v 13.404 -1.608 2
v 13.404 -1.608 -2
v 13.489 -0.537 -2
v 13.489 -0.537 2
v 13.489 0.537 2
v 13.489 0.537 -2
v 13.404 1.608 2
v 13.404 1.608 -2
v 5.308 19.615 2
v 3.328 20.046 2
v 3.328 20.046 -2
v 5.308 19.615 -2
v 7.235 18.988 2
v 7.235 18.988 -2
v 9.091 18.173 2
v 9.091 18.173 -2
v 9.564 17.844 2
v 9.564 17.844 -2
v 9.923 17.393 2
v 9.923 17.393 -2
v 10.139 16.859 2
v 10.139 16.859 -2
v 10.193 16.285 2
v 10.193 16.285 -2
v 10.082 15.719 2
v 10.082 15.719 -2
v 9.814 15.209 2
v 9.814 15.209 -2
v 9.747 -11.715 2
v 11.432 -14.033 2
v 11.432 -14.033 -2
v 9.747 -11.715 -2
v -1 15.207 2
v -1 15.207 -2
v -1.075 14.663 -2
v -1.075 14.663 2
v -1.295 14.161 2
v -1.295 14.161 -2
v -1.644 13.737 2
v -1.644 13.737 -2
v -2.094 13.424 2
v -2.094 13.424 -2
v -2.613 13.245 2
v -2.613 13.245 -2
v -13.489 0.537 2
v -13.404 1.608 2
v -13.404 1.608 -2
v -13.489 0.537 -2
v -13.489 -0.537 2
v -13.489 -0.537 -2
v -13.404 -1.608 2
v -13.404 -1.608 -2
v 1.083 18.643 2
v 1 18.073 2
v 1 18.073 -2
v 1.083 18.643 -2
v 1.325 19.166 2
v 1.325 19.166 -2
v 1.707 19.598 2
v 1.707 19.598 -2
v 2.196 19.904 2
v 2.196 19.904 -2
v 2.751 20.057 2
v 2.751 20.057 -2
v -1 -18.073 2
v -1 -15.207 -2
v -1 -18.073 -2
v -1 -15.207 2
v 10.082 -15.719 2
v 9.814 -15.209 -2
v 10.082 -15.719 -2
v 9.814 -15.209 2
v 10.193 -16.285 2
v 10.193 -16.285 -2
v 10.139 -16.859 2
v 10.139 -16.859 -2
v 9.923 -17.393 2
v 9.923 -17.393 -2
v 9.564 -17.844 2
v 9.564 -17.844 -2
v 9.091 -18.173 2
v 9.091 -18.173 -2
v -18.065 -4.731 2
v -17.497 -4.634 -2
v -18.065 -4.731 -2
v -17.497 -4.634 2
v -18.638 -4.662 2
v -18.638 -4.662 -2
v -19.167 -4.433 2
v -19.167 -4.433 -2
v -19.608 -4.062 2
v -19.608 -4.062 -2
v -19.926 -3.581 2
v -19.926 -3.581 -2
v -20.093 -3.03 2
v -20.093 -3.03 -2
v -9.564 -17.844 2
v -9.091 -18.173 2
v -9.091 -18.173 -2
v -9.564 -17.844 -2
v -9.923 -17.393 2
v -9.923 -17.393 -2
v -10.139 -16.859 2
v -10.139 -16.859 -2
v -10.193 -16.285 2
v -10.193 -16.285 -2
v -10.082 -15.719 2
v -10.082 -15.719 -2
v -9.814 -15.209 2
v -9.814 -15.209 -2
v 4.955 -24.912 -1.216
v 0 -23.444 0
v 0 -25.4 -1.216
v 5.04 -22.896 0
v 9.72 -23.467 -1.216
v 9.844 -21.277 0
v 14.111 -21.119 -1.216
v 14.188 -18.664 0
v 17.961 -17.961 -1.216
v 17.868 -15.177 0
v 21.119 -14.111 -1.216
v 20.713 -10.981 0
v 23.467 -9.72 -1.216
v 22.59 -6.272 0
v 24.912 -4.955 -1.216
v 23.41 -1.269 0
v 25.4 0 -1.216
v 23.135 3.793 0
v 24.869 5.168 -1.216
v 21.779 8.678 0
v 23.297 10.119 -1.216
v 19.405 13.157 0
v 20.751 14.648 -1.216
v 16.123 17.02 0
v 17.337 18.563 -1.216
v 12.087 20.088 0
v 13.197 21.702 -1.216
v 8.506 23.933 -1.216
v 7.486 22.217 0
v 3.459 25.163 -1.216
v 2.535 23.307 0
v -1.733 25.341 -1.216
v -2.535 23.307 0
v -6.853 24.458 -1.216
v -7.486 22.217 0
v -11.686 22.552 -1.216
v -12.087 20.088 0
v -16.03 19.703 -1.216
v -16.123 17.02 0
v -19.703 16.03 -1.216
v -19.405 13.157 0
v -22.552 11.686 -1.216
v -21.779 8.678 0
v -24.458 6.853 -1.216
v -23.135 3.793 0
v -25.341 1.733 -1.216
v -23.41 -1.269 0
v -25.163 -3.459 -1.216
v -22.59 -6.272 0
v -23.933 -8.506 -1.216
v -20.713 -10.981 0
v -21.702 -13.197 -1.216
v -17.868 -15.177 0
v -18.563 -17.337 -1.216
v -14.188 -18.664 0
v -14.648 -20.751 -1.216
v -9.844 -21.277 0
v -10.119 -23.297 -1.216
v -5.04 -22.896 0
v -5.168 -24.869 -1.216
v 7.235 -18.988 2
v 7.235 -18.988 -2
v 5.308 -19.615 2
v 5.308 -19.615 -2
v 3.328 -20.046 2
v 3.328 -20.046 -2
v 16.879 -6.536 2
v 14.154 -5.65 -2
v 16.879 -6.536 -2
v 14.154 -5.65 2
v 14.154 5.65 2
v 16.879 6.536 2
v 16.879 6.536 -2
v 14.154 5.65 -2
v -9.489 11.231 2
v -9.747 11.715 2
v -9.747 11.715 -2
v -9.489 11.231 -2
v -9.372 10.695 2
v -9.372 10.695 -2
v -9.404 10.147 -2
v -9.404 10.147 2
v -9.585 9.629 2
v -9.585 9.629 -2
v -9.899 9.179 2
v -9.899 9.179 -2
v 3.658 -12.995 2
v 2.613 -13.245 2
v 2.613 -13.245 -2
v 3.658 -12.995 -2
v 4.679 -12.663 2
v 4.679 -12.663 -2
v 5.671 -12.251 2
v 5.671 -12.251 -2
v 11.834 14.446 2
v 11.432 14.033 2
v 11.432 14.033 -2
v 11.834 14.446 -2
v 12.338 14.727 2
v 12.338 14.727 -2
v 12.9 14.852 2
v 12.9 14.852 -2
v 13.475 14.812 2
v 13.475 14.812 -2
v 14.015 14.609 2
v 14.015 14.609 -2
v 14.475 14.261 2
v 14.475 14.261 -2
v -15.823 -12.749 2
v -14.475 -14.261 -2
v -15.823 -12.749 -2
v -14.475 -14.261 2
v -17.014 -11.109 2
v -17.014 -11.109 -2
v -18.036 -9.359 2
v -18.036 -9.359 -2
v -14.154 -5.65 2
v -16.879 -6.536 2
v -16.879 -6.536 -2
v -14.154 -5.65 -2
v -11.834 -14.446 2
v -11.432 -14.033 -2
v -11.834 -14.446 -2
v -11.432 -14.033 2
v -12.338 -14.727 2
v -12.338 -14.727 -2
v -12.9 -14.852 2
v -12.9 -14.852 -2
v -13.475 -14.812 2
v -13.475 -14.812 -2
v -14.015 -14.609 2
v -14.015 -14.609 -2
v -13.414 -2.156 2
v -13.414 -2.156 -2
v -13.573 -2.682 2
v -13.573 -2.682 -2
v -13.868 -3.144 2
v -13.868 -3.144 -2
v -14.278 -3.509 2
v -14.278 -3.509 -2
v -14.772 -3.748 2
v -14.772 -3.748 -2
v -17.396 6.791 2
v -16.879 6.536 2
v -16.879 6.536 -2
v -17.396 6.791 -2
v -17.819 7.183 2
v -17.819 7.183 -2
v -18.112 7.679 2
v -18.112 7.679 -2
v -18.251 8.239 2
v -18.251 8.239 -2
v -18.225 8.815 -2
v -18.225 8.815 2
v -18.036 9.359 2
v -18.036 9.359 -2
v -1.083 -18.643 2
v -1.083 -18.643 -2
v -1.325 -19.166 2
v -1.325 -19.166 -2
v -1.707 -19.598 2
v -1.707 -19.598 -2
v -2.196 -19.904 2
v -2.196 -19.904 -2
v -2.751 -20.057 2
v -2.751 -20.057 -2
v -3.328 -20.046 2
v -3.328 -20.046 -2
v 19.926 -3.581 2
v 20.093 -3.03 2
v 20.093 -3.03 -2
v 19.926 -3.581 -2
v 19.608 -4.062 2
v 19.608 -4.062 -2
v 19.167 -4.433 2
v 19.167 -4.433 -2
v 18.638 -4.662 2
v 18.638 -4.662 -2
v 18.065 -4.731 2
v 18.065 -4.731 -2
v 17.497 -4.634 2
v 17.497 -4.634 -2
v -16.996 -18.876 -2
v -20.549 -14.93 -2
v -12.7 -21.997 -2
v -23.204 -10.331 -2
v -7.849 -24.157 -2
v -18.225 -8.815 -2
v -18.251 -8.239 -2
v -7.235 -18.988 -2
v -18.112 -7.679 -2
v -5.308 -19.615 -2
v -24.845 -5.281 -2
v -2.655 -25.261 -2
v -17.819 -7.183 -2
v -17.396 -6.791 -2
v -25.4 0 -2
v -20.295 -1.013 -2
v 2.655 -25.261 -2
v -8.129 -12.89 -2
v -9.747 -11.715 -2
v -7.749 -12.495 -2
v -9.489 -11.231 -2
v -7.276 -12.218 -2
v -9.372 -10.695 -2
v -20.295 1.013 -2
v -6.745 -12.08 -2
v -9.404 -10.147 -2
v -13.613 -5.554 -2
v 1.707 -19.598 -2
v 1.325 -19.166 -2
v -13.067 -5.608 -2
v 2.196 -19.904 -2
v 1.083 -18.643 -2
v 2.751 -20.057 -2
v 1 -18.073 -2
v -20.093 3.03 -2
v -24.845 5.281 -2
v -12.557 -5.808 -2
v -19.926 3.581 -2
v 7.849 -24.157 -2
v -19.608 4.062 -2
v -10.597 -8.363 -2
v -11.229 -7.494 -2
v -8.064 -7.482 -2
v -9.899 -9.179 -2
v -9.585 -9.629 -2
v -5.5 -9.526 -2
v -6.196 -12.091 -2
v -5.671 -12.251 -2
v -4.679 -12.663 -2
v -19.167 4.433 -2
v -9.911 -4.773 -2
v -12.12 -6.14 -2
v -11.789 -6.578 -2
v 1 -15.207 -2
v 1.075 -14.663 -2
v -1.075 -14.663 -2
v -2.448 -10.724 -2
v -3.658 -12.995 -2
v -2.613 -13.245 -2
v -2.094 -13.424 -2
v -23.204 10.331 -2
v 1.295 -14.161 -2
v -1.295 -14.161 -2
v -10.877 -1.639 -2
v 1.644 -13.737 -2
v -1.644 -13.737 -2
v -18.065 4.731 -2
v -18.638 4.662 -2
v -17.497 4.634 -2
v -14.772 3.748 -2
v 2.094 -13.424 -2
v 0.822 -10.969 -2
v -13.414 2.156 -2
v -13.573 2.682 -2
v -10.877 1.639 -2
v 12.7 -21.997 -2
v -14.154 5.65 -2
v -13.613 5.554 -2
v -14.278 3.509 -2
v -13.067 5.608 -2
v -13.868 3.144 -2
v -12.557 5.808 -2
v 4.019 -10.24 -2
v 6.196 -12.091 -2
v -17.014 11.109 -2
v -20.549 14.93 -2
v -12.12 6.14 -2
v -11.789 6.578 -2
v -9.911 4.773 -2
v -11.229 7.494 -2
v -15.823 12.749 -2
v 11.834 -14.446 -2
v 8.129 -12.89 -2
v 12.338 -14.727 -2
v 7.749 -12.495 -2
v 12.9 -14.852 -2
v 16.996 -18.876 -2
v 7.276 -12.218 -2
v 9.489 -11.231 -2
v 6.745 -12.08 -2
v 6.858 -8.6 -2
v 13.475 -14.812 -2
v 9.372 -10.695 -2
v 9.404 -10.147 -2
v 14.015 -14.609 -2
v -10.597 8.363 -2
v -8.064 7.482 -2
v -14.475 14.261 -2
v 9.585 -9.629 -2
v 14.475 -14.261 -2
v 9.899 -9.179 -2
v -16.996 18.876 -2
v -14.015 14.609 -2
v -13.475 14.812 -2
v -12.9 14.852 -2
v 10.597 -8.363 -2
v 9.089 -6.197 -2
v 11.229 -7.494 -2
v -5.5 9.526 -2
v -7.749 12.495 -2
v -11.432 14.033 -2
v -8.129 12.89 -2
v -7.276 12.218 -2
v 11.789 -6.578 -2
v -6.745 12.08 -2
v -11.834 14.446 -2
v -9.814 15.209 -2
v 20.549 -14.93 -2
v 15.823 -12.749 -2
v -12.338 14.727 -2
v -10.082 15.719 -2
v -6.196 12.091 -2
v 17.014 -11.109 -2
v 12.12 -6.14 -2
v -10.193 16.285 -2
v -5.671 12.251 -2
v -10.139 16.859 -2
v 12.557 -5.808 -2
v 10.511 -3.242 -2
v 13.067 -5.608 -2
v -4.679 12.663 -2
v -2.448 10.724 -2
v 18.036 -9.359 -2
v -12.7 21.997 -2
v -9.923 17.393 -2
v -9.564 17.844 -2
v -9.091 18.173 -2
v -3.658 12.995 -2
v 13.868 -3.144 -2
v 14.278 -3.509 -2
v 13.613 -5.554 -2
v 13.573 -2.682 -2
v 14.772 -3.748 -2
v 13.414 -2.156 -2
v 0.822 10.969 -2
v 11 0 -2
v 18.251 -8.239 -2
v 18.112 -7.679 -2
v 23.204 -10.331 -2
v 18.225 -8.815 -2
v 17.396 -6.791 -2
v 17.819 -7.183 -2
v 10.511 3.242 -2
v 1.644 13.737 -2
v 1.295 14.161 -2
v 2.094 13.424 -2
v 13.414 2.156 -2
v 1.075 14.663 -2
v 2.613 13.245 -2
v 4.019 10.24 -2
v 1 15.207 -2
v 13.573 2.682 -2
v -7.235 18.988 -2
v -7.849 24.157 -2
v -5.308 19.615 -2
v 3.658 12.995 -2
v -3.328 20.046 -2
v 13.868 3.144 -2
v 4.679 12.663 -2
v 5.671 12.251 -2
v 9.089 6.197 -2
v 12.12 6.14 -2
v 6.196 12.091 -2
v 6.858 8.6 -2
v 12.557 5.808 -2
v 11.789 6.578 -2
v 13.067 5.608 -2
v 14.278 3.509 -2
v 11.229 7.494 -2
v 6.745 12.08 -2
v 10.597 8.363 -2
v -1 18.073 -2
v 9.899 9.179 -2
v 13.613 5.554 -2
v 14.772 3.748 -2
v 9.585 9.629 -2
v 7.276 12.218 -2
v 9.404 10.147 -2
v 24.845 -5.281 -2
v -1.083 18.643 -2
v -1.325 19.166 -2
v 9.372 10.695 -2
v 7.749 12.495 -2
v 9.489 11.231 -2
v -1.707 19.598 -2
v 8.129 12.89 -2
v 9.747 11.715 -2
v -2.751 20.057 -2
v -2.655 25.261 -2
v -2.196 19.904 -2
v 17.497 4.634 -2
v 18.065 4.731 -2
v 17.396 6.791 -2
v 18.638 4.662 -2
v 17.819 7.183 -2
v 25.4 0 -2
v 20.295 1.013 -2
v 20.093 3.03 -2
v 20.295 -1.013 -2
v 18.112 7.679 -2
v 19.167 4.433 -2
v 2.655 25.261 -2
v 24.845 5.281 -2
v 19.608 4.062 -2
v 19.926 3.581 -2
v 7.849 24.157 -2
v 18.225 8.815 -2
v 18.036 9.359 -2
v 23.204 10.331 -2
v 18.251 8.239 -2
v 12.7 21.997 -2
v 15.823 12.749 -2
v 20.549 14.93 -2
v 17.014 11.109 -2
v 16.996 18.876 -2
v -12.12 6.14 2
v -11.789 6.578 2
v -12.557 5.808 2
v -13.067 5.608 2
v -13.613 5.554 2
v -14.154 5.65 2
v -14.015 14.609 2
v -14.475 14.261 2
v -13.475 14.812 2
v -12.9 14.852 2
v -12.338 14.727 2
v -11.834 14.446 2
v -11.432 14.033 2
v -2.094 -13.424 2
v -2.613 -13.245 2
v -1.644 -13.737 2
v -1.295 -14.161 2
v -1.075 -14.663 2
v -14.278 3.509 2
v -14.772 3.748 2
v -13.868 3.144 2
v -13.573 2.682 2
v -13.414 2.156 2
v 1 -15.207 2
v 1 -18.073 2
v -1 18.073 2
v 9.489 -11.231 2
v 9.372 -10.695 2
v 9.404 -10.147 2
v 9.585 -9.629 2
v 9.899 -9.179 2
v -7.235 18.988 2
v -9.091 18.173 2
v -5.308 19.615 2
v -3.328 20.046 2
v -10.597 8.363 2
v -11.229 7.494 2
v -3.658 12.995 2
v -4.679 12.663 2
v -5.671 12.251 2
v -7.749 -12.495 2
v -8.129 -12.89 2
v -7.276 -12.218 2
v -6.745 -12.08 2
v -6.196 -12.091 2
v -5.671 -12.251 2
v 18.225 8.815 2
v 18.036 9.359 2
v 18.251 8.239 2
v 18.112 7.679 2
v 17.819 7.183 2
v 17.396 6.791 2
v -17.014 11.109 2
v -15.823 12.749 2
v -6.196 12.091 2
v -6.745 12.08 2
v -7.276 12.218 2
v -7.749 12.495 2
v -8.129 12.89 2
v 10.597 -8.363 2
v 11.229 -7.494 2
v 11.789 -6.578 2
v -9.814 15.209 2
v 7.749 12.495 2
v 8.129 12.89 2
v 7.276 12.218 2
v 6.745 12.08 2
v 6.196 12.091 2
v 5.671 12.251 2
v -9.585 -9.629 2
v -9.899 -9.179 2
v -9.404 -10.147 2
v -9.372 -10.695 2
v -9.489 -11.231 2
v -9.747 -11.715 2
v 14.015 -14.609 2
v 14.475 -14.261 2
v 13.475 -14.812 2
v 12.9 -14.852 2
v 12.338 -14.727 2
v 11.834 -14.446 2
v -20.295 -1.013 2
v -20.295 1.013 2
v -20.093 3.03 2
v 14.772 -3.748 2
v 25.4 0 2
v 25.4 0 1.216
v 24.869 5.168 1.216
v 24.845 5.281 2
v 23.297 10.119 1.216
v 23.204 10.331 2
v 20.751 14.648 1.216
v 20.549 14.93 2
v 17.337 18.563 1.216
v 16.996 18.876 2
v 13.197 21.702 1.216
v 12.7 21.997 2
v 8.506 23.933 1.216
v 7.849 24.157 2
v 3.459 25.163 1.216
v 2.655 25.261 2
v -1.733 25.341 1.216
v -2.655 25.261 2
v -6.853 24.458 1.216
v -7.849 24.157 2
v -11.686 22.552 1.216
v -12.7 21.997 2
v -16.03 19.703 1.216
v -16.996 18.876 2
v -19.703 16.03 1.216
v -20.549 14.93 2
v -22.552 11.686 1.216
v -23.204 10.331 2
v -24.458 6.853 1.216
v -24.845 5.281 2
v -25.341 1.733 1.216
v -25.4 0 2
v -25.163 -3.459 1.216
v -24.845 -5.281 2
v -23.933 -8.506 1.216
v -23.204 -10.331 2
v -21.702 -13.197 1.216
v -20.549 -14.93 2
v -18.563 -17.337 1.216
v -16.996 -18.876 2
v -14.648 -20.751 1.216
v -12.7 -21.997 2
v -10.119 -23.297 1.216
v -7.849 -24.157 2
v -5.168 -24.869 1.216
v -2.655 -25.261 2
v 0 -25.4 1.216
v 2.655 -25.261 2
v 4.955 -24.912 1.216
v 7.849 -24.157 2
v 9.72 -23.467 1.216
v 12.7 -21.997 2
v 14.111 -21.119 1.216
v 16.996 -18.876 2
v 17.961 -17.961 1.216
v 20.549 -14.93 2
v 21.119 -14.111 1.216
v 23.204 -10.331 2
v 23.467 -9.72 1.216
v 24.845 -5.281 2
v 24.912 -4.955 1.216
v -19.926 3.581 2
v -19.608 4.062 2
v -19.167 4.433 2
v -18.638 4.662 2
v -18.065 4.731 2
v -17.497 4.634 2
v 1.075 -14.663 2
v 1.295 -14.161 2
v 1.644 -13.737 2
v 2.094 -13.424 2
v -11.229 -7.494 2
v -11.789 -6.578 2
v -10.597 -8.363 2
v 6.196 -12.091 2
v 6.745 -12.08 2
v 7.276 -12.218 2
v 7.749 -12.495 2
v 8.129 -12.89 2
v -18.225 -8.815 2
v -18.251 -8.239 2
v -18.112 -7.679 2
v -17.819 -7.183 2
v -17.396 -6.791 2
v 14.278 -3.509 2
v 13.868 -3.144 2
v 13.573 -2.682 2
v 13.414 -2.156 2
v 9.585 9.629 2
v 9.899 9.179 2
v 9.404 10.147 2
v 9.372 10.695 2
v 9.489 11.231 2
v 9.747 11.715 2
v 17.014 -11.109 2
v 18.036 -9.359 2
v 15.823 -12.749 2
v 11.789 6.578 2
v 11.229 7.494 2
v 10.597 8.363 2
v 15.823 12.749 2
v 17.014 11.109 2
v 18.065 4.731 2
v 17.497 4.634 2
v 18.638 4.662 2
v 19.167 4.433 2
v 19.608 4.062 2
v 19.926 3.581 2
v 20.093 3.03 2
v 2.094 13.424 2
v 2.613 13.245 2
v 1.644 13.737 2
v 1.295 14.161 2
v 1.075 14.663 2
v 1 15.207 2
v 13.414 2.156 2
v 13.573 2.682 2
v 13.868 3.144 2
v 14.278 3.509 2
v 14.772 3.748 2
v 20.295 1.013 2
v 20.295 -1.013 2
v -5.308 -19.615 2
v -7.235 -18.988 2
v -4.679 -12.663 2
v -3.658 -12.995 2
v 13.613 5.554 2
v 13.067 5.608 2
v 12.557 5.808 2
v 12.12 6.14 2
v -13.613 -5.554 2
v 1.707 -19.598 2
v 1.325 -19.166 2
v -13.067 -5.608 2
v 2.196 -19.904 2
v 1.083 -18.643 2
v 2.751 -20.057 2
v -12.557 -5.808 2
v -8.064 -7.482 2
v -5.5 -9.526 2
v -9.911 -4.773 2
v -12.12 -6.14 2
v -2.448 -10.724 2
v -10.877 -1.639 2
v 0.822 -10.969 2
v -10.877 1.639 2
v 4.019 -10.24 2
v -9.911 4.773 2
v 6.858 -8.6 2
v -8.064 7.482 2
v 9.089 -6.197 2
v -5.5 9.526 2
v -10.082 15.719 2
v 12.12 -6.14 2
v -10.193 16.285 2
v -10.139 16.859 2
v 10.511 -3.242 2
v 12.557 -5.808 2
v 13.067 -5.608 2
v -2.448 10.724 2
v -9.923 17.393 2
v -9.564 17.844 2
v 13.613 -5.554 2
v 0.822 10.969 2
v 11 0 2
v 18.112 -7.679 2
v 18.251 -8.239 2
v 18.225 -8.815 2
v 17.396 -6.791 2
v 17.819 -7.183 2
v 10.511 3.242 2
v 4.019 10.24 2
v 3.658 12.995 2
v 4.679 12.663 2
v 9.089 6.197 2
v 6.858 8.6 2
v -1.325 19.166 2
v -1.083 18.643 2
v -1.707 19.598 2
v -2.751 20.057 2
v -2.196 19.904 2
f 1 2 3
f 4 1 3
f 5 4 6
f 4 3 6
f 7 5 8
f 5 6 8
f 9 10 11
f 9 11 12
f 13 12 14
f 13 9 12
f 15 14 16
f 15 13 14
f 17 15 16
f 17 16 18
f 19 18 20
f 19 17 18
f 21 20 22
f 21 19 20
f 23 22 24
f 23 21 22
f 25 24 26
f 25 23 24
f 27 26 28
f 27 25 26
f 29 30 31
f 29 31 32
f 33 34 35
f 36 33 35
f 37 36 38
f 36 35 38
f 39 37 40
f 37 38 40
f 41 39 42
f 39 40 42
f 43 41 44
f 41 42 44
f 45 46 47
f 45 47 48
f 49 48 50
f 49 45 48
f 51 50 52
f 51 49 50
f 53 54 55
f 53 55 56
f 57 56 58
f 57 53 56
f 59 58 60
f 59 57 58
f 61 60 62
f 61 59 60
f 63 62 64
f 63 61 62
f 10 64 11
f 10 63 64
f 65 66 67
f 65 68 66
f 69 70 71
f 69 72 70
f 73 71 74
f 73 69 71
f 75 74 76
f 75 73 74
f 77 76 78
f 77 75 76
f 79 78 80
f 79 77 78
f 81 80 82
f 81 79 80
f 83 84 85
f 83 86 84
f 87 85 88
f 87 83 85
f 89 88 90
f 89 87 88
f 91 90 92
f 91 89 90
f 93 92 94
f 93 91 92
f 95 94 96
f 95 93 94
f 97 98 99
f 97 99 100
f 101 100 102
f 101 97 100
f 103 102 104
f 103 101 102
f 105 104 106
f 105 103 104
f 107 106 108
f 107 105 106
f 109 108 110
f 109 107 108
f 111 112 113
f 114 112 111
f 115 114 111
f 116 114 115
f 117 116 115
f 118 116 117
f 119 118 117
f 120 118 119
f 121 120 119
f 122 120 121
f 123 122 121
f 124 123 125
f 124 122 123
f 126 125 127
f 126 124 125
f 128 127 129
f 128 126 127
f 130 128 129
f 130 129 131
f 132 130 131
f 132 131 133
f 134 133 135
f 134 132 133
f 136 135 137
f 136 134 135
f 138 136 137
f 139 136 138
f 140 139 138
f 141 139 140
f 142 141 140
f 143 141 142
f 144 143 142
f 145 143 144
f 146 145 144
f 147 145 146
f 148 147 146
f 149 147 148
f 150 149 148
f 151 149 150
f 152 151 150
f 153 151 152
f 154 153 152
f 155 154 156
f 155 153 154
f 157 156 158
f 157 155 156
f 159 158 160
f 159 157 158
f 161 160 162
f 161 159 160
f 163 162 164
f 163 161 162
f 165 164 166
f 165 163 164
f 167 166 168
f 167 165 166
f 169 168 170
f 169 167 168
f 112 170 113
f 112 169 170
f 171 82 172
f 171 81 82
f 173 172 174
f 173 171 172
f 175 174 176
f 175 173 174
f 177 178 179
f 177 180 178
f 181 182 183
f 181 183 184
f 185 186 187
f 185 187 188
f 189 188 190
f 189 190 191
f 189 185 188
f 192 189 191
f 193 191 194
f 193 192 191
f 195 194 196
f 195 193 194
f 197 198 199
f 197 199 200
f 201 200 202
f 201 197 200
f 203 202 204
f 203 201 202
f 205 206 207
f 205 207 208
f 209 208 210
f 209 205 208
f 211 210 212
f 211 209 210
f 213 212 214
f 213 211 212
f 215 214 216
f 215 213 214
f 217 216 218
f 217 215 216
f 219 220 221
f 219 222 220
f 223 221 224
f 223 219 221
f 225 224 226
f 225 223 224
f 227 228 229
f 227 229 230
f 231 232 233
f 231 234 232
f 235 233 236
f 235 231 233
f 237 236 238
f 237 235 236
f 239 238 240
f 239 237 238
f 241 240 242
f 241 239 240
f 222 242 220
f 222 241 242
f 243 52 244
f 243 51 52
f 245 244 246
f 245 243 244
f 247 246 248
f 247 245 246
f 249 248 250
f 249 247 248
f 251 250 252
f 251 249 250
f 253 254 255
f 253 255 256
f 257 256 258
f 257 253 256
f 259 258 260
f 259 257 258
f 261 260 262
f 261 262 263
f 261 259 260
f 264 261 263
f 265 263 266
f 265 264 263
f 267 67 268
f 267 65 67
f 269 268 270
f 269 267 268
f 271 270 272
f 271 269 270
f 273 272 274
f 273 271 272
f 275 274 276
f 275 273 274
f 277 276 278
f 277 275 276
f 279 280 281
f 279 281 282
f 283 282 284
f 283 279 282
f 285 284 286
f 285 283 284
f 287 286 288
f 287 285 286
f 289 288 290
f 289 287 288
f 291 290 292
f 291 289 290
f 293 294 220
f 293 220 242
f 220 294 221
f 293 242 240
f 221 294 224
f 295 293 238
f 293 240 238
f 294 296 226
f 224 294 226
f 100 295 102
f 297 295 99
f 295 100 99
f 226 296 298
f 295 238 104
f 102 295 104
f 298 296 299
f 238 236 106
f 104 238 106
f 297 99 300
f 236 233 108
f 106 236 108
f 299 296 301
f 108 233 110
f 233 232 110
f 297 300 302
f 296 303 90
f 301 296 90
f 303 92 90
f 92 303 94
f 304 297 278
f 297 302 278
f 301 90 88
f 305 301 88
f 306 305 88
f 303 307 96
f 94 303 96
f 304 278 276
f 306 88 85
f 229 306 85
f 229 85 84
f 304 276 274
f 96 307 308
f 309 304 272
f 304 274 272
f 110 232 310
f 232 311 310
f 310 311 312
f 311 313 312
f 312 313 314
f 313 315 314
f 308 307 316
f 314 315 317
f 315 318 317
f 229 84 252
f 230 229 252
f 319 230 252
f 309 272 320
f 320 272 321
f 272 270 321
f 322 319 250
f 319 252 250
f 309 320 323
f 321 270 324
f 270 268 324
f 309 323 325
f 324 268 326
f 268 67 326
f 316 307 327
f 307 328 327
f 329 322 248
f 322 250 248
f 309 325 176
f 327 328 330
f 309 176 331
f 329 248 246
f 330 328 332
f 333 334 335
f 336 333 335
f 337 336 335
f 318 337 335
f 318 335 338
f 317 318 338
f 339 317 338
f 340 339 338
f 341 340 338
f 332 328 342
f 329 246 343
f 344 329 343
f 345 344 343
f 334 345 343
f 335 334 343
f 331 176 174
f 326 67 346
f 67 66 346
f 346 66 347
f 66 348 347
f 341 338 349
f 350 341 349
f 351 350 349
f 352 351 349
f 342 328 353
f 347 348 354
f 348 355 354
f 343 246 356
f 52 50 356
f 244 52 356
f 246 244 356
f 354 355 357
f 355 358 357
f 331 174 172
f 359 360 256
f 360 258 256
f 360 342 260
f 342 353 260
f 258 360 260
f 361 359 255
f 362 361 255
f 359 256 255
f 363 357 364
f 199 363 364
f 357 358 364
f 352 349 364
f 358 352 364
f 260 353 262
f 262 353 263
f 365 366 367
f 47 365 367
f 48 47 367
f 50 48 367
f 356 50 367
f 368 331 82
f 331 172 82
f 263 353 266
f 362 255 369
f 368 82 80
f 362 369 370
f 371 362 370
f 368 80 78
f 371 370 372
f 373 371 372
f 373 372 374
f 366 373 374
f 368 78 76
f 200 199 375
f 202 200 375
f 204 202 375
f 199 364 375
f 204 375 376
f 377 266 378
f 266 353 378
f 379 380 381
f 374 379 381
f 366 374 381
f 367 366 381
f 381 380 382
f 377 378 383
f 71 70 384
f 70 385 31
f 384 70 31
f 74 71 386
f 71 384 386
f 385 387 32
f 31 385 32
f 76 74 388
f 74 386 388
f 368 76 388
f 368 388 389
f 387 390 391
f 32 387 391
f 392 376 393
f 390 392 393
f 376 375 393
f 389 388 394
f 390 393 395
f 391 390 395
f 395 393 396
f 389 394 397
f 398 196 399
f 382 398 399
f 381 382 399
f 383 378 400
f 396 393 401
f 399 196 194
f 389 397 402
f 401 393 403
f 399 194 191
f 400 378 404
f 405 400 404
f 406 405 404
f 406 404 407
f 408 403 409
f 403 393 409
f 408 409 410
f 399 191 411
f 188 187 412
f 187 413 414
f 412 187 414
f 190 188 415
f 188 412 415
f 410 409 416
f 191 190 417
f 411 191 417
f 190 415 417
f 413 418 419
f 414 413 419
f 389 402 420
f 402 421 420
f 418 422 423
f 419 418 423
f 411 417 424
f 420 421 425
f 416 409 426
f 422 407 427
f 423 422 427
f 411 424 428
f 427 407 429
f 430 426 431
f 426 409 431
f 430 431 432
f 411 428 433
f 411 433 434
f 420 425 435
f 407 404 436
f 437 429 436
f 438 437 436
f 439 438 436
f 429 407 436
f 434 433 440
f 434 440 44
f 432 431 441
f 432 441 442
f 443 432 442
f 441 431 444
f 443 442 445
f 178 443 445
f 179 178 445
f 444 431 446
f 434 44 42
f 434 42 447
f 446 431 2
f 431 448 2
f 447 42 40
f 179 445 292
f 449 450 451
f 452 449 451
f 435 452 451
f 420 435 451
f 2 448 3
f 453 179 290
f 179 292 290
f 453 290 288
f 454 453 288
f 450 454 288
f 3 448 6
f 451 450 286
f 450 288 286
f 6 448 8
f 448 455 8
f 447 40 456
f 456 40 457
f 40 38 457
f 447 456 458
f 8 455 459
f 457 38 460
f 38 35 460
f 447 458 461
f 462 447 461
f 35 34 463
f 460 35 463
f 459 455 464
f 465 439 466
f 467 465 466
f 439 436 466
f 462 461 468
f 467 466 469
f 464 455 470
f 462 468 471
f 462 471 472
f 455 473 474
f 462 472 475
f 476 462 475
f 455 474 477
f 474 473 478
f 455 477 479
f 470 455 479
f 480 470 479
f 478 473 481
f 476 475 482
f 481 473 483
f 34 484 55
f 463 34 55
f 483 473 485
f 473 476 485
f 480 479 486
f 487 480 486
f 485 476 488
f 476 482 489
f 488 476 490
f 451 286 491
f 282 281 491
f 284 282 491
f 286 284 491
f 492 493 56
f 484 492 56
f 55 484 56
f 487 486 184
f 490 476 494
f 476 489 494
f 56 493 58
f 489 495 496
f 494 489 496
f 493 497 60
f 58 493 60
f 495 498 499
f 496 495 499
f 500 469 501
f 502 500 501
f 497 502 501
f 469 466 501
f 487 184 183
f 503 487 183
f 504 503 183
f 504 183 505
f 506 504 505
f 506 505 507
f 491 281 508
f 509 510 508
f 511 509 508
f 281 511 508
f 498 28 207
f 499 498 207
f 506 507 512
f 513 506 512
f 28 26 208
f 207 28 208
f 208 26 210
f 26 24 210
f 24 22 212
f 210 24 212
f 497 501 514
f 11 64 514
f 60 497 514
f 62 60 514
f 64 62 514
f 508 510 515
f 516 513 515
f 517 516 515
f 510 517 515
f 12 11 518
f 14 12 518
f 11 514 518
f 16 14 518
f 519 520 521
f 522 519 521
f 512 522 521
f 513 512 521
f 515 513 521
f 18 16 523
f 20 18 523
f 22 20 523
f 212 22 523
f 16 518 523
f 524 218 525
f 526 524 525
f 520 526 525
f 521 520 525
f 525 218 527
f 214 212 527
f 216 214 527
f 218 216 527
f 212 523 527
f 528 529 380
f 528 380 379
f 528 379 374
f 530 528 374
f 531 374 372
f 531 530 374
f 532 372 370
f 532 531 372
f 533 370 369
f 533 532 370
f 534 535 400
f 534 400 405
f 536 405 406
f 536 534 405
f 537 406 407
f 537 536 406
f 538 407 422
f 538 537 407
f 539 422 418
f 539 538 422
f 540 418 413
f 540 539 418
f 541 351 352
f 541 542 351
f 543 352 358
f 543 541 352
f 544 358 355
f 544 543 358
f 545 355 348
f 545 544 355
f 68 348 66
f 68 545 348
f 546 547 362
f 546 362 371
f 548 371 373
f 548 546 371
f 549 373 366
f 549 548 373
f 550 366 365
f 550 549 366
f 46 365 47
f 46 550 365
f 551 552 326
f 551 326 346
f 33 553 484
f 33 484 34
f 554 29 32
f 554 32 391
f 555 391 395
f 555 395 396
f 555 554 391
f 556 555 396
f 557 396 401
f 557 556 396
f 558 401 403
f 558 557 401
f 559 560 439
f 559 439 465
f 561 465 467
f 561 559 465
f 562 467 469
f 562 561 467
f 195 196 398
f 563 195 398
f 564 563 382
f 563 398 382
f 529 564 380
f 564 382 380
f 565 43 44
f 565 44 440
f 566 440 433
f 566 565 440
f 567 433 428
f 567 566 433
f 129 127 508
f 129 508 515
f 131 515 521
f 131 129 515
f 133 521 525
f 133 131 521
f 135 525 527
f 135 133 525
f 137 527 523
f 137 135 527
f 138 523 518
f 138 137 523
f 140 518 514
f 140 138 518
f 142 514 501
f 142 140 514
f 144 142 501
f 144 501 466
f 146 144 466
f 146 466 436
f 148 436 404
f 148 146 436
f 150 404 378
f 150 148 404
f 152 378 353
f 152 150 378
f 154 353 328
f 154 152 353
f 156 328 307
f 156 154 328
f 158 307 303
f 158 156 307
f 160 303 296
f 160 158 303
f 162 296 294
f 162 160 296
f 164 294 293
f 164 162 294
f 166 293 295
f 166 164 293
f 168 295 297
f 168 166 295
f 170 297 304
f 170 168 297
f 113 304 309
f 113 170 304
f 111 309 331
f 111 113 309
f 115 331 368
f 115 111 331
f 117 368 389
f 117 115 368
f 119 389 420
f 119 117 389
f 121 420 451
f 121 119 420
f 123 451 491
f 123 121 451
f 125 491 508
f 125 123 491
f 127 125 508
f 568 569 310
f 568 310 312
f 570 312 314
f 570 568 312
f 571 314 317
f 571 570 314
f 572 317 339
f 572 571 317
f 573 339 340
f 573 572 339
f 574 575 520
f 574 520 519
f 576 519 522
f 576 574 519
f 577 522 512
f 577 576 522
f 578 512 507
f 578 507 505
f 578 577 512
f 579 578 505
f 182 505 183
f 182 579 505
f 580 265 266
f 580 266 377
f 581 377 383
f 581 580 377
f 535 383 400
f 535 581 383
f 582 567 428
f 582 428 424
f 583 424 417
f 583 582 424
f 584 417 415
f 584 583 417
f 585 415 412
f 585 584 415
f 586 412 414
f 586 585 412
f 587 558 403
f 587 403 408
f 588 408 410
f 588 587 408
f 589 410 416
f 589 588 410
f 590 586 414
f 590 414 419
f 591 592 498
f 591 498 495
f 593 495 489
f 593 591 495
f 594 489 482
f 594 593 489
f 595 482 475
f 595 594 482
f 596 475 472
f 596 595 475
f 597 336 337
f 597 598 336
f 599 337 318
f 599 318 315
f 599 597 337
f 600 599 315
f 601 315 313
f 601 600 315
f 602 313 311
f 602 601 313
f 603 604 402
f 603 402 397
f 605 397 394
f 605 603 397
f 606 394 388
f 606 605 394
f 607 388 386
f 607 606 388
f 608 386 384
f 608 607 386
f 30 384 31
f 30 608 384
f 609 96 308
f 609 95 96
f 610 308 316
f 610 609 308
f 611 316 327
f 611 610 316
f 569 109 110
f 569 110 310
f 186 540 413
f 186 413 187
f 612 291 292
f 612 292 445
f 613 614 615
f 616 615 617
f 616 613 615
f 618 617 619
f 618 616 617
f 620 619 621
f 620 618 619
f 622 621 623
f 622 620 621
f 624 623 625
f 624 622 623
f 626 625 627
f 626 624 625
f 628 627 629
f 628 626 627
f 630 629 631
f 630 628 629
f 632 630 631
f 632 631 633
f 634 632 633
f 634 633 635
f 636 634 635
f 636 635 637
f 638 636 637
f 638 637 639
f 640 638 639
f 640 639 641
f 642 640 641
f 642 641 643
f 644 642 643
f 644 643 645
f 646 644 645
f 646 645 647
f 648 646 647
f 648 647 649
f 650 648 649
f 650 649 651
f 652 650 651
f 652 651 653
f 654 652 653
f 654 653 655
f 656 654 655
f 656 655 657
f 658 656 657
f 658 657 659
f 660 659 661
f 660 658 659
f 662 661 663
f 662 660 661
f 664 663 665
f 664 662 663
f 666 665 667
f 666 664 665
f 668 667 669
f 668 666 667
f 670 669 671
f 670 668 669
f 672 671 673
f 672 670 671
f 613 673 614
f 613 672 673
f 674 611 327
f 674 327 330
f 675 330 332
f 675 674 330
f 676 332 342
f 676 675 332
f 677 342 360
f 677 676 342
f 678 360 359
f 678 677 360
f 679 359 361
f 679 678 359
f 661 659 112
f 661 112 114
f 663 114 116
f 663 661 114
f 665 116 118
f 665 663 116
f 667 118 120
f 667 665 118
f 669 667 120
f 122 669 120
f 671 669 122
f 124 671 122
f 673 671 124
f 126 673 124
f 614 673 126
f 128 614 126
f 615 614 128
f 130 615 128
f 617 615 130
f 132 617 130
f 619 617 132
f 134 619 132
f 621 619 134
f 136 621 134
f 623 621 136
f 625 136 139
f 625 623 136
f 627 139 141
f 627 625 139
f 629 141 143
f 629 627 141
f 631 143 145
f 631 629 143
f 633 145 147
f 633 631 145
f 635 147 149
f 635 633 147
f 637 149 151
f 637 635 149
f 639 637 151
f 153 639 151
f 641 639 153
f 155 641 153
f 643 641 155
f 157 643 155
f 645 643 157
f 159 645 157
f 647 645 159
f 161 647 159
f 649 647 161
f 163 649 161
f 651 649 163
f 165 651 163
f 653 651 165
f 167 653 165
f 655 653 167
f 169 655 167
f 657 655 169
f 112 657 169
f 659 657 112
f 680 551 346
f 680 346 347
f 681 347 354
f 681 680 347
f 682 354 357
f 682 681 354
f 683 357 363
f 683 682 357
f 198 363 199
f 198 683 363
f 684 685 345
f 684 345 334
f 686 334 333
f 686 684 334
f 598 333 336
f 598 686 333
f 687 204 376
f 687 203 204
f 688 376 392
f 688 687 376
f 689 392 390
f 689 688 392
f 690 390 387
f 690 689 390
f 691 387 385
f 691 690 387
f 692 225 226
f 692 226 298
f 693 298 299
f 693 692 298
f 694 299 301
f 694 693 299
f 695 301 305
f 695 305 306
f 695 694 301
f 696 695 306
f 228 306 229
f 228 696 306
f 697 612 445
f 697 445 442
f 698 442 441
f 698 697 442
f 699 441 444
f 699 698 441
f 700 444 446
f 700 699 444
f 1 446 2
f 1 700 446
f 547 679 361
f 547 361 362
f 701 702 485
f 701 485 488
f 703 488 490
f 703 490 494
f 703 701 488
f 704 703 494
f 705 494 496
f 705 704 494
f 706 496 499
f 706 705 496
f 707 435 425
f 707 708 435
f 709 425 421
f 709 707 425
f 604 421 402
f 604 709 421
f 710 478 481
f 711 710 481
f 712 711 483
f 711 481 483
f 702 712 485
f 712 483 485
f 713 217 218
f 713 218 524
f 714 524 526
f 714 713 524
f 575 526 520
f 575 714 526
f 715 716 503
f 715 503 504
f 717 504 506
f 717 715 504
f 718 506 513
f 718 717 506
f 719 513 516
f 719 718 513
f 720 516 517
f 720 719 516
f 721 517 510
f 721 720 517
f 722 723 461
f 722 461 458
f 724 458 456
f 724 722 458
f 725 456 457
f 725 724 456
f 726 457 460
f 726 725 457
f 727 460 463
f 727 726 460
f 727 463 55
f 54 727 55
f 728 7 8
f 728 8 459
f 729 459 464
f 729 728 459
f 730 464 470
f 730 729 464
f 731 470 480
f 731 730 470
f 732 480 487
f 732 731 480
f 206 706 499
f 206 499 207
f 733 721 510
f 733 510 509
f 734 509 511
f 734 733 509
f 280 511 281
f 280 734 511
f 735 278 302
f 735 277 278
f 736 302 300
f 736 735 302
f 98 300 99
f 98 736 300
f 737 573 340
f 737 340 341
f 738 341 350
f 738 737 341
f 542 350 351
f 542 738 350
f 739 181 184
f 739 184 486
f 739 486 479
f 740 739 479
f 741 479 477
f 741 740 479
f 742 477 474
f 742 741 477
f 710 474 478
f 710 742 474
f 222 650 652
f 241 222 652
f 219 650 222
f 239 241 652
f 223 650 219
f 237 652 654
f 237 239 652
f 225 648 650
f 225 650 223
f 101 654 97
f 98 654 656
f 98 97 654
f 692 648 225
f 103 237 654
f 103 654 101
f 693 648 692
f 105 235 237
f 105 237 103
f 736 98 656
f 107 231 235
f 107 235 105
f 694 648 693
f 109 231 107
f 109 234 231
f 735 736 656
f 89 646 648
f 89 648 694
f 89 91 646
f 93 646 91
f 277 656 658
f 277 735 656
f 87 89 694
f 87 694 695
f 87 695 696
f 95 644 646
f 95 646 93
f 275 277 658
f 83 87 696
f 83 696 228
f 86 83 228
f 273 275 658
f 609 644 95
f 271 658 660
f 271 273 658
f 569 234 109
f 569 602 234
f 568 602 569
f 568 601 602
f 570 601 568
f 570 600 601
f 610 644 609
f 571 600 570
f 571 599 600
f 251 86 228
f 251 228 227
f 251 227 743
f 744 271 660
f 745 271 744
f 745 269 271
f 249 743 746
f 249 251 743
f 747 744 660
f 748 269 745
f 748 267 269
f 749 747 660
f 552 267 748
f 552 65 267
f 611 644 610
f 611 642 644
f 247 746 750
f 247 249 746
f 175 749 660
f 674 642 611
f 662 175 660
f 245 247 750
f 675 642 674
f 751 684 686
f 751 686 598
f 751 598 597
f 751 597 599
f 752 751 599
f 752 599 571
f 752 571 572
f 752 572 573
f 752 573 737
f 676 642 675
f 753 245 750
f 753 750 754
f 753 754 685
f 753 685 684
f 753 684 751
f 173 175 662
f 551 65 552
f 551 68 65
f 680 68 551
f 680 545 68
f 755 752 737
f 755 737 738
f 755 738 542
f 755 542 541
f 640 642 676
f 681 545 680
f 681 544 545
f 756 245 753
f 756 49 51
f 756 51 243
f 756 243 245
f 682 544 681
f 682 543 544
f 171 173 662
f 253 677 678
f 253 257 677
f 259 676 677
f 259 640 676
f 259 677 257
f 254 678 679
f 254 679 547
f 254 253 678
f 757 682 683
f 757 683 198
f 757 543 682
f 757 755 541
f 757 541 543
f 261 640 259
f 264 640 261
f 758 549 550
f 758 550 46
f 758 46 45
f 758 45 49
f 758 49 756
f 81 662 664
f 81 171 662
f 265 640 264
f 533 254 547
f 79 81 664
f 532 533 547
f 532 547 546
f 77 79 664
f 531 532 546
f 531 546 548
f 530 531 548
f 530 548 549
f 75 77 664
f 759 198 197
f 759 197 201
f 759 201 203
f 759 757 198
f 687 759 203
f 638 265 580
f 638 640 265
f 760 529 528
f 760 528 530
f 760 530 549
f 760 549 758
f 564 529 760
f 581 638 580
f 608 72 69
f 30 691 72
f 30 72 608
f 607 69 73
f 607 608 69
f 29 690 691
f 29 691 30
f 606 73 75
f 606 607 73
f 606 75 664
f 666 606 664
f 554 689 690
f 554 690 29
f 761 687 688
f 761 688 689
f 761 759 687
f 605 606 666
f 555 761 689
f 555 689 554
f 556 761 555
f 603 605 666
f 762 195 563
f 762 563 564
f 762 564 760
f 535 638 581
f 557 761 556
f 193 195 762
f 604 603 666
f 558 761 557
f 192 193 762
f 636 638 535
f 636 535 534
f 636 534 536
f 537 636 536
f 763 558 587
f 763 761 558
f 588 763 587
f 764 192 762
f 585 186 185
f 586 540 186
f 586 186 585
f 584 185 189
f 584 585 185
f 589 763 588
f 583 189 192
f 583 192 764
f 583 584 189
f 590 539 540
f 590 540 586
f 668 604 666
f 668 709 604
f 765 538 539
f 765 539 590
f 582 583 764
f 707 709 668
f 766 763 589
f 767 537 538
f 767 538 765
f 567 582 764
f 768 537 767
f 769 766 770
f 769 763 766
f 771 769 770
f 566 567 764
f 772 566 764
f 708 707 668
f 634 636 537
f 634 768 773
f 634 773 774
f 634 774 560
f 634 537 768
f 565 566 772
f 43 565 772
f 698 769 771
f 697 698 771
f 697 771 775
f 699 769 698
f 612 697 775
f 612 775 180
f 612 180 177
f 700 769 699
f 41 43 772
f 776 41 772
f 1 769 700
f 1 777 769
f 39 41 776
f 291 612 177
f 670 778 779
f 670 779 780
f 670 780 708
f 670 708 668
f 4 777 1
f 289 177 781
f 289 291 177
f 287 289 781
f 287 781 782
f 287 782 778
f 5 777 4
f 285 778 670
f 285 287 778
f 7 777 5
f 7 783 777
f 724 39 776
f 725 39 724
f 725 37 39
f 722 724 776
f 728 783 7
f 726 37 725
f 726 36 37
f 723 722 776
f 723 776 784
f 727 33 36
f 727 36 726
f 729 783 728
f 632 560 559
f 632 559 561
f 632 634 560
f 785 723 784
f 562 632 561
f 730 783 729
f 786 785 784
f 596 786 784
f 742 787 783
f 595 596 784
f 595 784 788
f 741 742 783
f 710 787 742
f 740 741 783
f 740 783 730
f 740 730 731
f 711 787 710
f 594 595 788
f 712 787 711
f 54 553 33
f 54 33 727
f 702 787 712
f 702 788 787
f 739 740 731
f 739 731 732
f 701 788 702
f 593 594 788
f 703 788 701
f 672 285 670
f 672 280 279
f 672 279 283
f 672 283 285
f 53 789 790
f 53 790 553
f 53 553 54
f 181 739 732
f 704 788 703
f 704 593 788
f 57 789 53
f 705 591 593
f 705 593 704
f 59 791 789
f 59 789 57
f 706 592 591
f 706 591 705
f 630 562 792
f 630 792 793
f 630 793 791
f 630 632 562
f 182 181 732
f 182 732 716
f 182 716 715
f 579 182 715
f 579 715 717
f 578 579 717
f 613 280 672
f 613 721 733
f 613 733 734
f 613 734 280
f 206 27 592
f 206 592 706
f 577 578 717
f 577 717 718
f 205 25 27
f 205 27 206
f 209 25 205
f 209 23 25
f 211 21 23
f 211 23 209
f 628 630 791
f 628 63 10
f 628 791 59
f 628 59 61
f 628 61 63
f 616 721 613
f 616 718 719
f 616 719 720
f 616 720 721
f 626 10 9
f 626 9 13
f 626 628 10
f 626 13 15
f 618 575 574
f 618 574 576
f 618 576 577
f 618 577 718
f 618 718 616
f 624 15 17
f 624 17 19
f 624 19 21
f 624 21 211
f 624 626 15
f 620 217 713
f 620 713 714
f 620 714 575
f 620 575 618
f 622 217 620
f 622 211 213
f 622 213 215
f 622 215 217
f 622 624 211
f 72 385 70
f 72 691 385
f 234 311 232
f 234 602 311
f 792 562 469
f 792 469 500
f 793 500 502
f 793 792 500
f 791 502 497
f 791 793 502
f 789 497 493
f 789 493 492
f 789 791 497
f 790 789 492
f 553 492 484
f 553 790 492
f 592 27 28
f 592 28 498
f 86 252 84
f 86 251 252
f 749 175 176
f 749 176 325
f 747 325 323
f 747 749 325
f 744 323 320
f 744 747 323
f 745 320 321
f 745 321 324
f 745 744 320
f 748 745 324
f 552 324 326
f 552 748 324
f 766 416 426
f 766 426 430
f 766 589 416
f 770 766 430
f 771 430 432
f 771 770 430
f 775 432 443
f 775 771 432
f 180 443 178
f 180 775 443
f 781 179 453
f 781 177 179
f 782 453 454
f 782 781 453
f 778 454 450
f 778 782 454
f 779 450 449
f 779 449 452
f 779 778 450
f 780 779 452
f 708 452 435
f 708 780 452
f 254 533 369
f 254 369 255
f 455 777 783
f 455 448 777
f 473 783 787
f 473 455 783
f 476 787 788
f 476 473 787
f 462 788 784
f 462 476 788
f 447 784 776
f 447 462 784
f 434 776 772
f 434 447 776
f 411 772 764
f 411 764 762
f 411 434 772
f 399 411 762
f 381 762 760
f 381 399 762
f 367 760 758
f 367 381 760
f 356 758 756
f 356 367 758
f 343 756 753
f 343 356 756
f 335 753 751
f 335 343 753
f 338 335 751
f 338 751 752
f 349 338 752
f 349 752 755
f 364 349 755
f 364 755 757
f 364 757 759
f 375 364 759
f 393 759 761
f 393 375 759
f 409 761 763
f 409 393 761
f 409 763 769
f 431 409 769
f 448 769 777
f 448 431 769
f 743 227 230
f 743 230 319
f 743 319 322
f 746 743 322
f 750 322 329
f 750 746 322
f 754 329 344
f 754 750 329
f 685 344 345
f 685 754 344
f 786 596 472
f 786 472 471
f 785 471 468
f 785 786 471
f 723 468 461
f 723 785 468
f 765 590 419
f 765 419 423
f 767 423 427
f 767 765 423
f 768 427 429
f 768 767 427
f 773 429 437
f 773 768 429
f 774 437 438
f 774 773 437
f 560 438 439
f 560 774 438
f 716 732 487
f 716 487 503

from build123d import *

# Parameters (mm, degrees)
F0_R     = 25.4
F0_R_2   = 11
F1_DEPTH = 2


with BuildPart() as f1:
    # F0 (on Top) → F1 (new body, symmetric)
    with BuildSketch(Plane.XY):
        Circle(F0_R)
        with BuildLine():
            ThreePointArc((-9.090554, -18.173173), (-10.138809, -16.858575), (-9.813848, -15.208905))
            Line((-9.813848, -15.208905), (-8.129378, -12.890431))
            ThreePointArc((-8.129378, -12.890431), (-7.014806, -12.130407), (-5.671171, -12.251033))
            ThreePointArc((-5.671171, -12.251033), (-4.171729, -12.839263), (-2.612903, -13.244725))
            ThreePointArc((-2.612903, -13.244725), (-1.454977, -13.936905), (-1, -15.206906))
            Line((-1, -15.206906), (-1, -18.072698))
            ThreePointArc((-1, -18.072698), (-1.706753, -19.598316), (-3.327511, -20.0457))
            ThreePointArc((-3.327511, -20.0457), (-6.279225, -19.325468), (-9.090554, -18.173173))
        make_face(mode=Mode.SUBTRACT)
        with BuildLine():
            ThreePointArc((-18.036336, -9.359113), (-18.11169, -7.679431), (-16.87914, -6.535827))
            Line((-16.87914, -6.535827), (-14.15361, -5.650249))
            ThreePointArc((-14.15361, -5.650249), (-12.805172, -5.690506), (-11.78905, -6.577864))
            ThreePointArc((-11.78905, -6.577864), (-10.921729, -7.935101), (-9.898937, -9.179382))
            ThreePointArc((-9.898937, -9.179382), (-9.369008, -10.419979), (-9.747412, -11.71486))
            Line((-9.747412, -11.71486), (-11.431882, -14.033334))
            ThreePointArc((-11.431882, -14.033334), (-12.900393, -14.852167), (-14.474579, -14.26145))
            ThreePointArc((-14.474579, -14.26145), (-16.439225, -11.943796), (-18.036336, -9.359113))
        make_face(mode=Mode.SUBTRACT)
        with BuildLine():
            ThreePointArc((-20.092851, 3.029811), (-19.166522, 4.432995), (-17.497174, 4.633714))
            Line((-17.497174, 4.633714), (-14.771644, 3.748136))
            ThreePointArc((-14.771644, 3.748136), (-13.704397, 2.922975), (-13.403913, 1.607826))
            ThreePointArc((-13.403913, 1.607826), (-13.5, 0), (-13.403913, -1.607826))
            ThreePointArc((-13.403913, -1.607826), (-13.704397, -2.922975), (-14.771644, -3.748136))
            Line((-14.771644, -3.748136), (-17.497174, -4.633714))
            ThreePointArc((-17.497174, -4.633714), (-19.166522, -4.432995), (-20.092851, -3.029811))
            ThreePointArc((-20.092851, -3.029811), (-20.32, 0), (-20.092851, 3.029811))
        make_face(mode=Mode.SUBTRACT)
        Circle(F0_R_2, mode=Mode.SUBTRACT)
        with BuildLine():
            ThreePointArc((3.327511, -20.0457), (1.706753, -19.598316), (1, -18.072698))
            Line((1, -18.072698), (1, -15.206906))
            ThreePointArc((1, -15.206906), (1.454977, -13.936905), (2.612903, -13.244725))
            ThreePointArc((2.612903, -13.244725), (4.171729, -12.839263), (5.671171, -12.251033))
            ThreePointArc((5.671171, -12.251033), (7.014806, -12.130407), (8.129378, -12.890431))
            Line((8.129378, -12.890431), (9.813848, -15.208905))
            ThreePointArc((9.813848, -15.208905), (10.138809, -16.858575), (9.090554, -18.173173))
            ThreePointArc((9.090554, -18.173173), (6.279225, -19.325468), (3.327511, -20.0457))
        make_face(mode=Mode.SUBTRACT)
        with BuildLine():
            ThreePointArc((14.474579, -14.26145), (12.900393, -14.852167), (11.431882, -14.033334))
            Line((11.431882, -14.033334), (9.747412, -11.71486))
            ThreePointArc((9.747412, -11.71486), (9.369008, -10.419979), (9.898937, -9.179382))
            ThreePointArc((9.898937, -9.179382), (10.921729, -7.935101), (11.78905, -6.577864))
            ThreePointArc((11.78905, -6.577864), (12.805172, -5.690506), (14.15361, -5.650249))
            Line((14.15361, -5.650249), (16.87914, -6.535827))
            ThreePointArc((16.87914, -6.535827), (18.11169, -7.679431), (18.036336, -9.359113))
            ThreePointArc((18.036336, -9.359113), (16.439225, -11.943796), (14.474579, -14.26145))
        make_face(mode=Mode.SUBTRACT)
        with BuildLine():
            ThreePointArc((20.092851, -3.029811), (19.166522, -4.432995), (17.497174, -4.633714))
            Line((17.497174, -4.633714), (14.771644, -3.748136))
            ThreePointArc((14.771644, -3.748136), (13.704397, -2.922975), (13.403913, -1.607826))
            ThreePointArc((13.403913, -1.607826), (13.5, 0), (13.403913, 1.607826))
            ThreePointArc((13.403913, 1.607826), (13.704397, 2.922975), (14.771644, 3.748136))
            Line((14.771644, 3.748136), (17.497174, 4.633714))
            ThreePointArc((17.497174, 4.633714), (19.166522, 4.432995), (20.092851, 3.029811))
            ThreePointArc((20.092851, 3.029811), (20.32, 0), (20.092851, -3.029811))
        make_face(mode=Mode.SUBTRACT)
        with BuildLine():
            ThreePointArc((-14.474579, 14.26145), (-12.900393, 14.852167), (-11.431882, 14.033334))
            Line((-11.431882, 14.033334), (-9.747412, 11.71486))
            ThreePointArc((-9.747412, 11.71486), (-9.369008, 10.419979), (-9.898937, 9.179382))
            ThreePointArc((-9.898937, 9.179382), (-10.921729, 7.935101), (-11.78905, 6.577864))
            ThreePointArc((-11.78905, 6.577864), (-12.805172, 5.690506), (-14.15361, 5.650249))
            Line((-14.15361, 5.650249), (-16.87914, 6.535827))
            ThreePointArc((-16.87914, 6.535827), (-18.11169, 7.679431), (-18.036336, 9.359113))
            ThreePointArc((-18.036336, 9.359113), (-16.439225, 11.943796), (-14.474579, 14.26145))
        make_face(mode=Mode.SUBTRACT)
        with BuildLine():
            ThreePointArc((-9.090554, 18.173173), (-6.279225, 19.325468), (-3.327511, 20.0457))
            ThreePointArc((-3.327511, 20.0457), (-1.706753, 19.598316), (-1, 18.072698))
            Line((-1, 18.072698), (-1, 15.206906))
            ThreePointArc((-1, 15.206906), (-1.454977, 13.936905), (-2.612903, 13.244725))
            ThreePointArc((-2.612903, 13.244725), (-4.171729, 12.839263), (-5.671171, 12.251033))
            ThreePointArc((-5.671171, 12.251033), (-7.014806, 12.130407), (-8.129378, 12.890431))
            Line((-8.129378, 12.890431), (-9.813848, 15.208905))
            ThreePointArc((-9.813848, 15.208905), (-10.138809, 16.858575), (-9.090554, 18.173173))
        make_face(mode=Mode.SUBTRACT)
        with BuildLine():
            ThreePointArc((18.036336, 9.359113), (18.11169, 7.679431), (16.87914, 6.535827))
            Line((16.87914, 6.535827), (14.15361, 5.650249))
            ThreePointArc((14.15361, 5.650249), (12.805172, 5.690506), (11.78905, 6.577864))
            ThreePointArc((11.78905, 6.577864), (10.921729, 7.935101), (9.898937, 9.179382))
            ThreePointArc((9.898937, 9.179382), (9.369008, 10.419979), (9.747412, 11.71486))
            Line((9.747412, 11.71486), (11.431882, 14.033334))
            ThreePointArc((11.431882, 14.033334), (12.900393, 14.852167), (14.474579, 14.26145))
            ThreePointArc((14.474579, 14.26145), (16.439225, 11.943796), (18.036336, 9.359113))
        make_face(mode=Mode.SUBTRACT)
        with BuildLine():
            Line((1, 15.206906), (1, 18.072698))
            ThreePointArc((1, 18.072698), (1.706753, 19.598316), (3.327511, 20.0457))
            ThreePointArc((3.327511, 20.0457), (6.279225, 19.325468), (9.090554, 18.173173))
            ThreePointArc((9.090554, 18.173173), (10.138809, 16.858575), (9.813848, 15.208905))
            Line((9.813848, 15.208905), (8.129378, 12.890431))
            ThreePointArc((8.129378, 12.890431), (7.014806, 12.130407), (5.671171, 12.251033))
            ThreePointArc((5.671171, 12.251033), (4.171729, 12.839263), (2.612903, 13.244725))
            ThreePointArc((2.612903, 13.244725), (1.454977, 13.936905), (1, 15.206906))
        make_face(mode=Mode.SUBTRACT)
    extrude(amount=F1_DEPTH, both=True)

    # F2 (on Right) → F3 (revolve, cut)
    with BuildSketch(Plane.YZ):
        Polygon((-25.4442, 1.243426), (-25.4442, 0), (-23.4442, 0), align=None)
        Polygon((-23.4442, 0), (-25.4442, 0), (-25.4442, -1.243426), align=None)
    revolve(axis=Axis((0, 0, -6.003845), (0, 0, 1)), mode=Mode.SUBTRACT)


solid = f1.part
